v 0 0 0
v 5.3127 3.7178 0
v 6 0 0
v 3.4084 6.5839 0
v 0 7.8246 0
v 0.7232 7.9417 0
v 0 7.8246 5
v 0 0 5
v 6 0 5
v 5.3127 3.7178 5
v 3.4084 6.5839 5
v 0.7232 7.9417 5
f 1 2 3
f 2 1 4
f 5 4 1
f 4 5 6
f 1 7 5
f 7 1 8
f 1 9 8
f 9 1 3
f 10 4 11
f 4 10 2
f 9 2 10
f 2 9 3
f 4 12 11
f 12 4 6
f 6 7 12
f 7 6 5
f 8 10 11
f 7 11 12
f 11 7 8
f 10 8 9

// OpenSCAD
// Generated by generate_scads.py
scale([1.5,2.0,0.5]) {
  intersection() {
    cube(size=[15,30,15], center=false);
    cylinder(h=25, r=4, center=false);
    cylinder(h=30, r=10, center=true);
    cube(size=[10,5,10], center=false);
  }
}
